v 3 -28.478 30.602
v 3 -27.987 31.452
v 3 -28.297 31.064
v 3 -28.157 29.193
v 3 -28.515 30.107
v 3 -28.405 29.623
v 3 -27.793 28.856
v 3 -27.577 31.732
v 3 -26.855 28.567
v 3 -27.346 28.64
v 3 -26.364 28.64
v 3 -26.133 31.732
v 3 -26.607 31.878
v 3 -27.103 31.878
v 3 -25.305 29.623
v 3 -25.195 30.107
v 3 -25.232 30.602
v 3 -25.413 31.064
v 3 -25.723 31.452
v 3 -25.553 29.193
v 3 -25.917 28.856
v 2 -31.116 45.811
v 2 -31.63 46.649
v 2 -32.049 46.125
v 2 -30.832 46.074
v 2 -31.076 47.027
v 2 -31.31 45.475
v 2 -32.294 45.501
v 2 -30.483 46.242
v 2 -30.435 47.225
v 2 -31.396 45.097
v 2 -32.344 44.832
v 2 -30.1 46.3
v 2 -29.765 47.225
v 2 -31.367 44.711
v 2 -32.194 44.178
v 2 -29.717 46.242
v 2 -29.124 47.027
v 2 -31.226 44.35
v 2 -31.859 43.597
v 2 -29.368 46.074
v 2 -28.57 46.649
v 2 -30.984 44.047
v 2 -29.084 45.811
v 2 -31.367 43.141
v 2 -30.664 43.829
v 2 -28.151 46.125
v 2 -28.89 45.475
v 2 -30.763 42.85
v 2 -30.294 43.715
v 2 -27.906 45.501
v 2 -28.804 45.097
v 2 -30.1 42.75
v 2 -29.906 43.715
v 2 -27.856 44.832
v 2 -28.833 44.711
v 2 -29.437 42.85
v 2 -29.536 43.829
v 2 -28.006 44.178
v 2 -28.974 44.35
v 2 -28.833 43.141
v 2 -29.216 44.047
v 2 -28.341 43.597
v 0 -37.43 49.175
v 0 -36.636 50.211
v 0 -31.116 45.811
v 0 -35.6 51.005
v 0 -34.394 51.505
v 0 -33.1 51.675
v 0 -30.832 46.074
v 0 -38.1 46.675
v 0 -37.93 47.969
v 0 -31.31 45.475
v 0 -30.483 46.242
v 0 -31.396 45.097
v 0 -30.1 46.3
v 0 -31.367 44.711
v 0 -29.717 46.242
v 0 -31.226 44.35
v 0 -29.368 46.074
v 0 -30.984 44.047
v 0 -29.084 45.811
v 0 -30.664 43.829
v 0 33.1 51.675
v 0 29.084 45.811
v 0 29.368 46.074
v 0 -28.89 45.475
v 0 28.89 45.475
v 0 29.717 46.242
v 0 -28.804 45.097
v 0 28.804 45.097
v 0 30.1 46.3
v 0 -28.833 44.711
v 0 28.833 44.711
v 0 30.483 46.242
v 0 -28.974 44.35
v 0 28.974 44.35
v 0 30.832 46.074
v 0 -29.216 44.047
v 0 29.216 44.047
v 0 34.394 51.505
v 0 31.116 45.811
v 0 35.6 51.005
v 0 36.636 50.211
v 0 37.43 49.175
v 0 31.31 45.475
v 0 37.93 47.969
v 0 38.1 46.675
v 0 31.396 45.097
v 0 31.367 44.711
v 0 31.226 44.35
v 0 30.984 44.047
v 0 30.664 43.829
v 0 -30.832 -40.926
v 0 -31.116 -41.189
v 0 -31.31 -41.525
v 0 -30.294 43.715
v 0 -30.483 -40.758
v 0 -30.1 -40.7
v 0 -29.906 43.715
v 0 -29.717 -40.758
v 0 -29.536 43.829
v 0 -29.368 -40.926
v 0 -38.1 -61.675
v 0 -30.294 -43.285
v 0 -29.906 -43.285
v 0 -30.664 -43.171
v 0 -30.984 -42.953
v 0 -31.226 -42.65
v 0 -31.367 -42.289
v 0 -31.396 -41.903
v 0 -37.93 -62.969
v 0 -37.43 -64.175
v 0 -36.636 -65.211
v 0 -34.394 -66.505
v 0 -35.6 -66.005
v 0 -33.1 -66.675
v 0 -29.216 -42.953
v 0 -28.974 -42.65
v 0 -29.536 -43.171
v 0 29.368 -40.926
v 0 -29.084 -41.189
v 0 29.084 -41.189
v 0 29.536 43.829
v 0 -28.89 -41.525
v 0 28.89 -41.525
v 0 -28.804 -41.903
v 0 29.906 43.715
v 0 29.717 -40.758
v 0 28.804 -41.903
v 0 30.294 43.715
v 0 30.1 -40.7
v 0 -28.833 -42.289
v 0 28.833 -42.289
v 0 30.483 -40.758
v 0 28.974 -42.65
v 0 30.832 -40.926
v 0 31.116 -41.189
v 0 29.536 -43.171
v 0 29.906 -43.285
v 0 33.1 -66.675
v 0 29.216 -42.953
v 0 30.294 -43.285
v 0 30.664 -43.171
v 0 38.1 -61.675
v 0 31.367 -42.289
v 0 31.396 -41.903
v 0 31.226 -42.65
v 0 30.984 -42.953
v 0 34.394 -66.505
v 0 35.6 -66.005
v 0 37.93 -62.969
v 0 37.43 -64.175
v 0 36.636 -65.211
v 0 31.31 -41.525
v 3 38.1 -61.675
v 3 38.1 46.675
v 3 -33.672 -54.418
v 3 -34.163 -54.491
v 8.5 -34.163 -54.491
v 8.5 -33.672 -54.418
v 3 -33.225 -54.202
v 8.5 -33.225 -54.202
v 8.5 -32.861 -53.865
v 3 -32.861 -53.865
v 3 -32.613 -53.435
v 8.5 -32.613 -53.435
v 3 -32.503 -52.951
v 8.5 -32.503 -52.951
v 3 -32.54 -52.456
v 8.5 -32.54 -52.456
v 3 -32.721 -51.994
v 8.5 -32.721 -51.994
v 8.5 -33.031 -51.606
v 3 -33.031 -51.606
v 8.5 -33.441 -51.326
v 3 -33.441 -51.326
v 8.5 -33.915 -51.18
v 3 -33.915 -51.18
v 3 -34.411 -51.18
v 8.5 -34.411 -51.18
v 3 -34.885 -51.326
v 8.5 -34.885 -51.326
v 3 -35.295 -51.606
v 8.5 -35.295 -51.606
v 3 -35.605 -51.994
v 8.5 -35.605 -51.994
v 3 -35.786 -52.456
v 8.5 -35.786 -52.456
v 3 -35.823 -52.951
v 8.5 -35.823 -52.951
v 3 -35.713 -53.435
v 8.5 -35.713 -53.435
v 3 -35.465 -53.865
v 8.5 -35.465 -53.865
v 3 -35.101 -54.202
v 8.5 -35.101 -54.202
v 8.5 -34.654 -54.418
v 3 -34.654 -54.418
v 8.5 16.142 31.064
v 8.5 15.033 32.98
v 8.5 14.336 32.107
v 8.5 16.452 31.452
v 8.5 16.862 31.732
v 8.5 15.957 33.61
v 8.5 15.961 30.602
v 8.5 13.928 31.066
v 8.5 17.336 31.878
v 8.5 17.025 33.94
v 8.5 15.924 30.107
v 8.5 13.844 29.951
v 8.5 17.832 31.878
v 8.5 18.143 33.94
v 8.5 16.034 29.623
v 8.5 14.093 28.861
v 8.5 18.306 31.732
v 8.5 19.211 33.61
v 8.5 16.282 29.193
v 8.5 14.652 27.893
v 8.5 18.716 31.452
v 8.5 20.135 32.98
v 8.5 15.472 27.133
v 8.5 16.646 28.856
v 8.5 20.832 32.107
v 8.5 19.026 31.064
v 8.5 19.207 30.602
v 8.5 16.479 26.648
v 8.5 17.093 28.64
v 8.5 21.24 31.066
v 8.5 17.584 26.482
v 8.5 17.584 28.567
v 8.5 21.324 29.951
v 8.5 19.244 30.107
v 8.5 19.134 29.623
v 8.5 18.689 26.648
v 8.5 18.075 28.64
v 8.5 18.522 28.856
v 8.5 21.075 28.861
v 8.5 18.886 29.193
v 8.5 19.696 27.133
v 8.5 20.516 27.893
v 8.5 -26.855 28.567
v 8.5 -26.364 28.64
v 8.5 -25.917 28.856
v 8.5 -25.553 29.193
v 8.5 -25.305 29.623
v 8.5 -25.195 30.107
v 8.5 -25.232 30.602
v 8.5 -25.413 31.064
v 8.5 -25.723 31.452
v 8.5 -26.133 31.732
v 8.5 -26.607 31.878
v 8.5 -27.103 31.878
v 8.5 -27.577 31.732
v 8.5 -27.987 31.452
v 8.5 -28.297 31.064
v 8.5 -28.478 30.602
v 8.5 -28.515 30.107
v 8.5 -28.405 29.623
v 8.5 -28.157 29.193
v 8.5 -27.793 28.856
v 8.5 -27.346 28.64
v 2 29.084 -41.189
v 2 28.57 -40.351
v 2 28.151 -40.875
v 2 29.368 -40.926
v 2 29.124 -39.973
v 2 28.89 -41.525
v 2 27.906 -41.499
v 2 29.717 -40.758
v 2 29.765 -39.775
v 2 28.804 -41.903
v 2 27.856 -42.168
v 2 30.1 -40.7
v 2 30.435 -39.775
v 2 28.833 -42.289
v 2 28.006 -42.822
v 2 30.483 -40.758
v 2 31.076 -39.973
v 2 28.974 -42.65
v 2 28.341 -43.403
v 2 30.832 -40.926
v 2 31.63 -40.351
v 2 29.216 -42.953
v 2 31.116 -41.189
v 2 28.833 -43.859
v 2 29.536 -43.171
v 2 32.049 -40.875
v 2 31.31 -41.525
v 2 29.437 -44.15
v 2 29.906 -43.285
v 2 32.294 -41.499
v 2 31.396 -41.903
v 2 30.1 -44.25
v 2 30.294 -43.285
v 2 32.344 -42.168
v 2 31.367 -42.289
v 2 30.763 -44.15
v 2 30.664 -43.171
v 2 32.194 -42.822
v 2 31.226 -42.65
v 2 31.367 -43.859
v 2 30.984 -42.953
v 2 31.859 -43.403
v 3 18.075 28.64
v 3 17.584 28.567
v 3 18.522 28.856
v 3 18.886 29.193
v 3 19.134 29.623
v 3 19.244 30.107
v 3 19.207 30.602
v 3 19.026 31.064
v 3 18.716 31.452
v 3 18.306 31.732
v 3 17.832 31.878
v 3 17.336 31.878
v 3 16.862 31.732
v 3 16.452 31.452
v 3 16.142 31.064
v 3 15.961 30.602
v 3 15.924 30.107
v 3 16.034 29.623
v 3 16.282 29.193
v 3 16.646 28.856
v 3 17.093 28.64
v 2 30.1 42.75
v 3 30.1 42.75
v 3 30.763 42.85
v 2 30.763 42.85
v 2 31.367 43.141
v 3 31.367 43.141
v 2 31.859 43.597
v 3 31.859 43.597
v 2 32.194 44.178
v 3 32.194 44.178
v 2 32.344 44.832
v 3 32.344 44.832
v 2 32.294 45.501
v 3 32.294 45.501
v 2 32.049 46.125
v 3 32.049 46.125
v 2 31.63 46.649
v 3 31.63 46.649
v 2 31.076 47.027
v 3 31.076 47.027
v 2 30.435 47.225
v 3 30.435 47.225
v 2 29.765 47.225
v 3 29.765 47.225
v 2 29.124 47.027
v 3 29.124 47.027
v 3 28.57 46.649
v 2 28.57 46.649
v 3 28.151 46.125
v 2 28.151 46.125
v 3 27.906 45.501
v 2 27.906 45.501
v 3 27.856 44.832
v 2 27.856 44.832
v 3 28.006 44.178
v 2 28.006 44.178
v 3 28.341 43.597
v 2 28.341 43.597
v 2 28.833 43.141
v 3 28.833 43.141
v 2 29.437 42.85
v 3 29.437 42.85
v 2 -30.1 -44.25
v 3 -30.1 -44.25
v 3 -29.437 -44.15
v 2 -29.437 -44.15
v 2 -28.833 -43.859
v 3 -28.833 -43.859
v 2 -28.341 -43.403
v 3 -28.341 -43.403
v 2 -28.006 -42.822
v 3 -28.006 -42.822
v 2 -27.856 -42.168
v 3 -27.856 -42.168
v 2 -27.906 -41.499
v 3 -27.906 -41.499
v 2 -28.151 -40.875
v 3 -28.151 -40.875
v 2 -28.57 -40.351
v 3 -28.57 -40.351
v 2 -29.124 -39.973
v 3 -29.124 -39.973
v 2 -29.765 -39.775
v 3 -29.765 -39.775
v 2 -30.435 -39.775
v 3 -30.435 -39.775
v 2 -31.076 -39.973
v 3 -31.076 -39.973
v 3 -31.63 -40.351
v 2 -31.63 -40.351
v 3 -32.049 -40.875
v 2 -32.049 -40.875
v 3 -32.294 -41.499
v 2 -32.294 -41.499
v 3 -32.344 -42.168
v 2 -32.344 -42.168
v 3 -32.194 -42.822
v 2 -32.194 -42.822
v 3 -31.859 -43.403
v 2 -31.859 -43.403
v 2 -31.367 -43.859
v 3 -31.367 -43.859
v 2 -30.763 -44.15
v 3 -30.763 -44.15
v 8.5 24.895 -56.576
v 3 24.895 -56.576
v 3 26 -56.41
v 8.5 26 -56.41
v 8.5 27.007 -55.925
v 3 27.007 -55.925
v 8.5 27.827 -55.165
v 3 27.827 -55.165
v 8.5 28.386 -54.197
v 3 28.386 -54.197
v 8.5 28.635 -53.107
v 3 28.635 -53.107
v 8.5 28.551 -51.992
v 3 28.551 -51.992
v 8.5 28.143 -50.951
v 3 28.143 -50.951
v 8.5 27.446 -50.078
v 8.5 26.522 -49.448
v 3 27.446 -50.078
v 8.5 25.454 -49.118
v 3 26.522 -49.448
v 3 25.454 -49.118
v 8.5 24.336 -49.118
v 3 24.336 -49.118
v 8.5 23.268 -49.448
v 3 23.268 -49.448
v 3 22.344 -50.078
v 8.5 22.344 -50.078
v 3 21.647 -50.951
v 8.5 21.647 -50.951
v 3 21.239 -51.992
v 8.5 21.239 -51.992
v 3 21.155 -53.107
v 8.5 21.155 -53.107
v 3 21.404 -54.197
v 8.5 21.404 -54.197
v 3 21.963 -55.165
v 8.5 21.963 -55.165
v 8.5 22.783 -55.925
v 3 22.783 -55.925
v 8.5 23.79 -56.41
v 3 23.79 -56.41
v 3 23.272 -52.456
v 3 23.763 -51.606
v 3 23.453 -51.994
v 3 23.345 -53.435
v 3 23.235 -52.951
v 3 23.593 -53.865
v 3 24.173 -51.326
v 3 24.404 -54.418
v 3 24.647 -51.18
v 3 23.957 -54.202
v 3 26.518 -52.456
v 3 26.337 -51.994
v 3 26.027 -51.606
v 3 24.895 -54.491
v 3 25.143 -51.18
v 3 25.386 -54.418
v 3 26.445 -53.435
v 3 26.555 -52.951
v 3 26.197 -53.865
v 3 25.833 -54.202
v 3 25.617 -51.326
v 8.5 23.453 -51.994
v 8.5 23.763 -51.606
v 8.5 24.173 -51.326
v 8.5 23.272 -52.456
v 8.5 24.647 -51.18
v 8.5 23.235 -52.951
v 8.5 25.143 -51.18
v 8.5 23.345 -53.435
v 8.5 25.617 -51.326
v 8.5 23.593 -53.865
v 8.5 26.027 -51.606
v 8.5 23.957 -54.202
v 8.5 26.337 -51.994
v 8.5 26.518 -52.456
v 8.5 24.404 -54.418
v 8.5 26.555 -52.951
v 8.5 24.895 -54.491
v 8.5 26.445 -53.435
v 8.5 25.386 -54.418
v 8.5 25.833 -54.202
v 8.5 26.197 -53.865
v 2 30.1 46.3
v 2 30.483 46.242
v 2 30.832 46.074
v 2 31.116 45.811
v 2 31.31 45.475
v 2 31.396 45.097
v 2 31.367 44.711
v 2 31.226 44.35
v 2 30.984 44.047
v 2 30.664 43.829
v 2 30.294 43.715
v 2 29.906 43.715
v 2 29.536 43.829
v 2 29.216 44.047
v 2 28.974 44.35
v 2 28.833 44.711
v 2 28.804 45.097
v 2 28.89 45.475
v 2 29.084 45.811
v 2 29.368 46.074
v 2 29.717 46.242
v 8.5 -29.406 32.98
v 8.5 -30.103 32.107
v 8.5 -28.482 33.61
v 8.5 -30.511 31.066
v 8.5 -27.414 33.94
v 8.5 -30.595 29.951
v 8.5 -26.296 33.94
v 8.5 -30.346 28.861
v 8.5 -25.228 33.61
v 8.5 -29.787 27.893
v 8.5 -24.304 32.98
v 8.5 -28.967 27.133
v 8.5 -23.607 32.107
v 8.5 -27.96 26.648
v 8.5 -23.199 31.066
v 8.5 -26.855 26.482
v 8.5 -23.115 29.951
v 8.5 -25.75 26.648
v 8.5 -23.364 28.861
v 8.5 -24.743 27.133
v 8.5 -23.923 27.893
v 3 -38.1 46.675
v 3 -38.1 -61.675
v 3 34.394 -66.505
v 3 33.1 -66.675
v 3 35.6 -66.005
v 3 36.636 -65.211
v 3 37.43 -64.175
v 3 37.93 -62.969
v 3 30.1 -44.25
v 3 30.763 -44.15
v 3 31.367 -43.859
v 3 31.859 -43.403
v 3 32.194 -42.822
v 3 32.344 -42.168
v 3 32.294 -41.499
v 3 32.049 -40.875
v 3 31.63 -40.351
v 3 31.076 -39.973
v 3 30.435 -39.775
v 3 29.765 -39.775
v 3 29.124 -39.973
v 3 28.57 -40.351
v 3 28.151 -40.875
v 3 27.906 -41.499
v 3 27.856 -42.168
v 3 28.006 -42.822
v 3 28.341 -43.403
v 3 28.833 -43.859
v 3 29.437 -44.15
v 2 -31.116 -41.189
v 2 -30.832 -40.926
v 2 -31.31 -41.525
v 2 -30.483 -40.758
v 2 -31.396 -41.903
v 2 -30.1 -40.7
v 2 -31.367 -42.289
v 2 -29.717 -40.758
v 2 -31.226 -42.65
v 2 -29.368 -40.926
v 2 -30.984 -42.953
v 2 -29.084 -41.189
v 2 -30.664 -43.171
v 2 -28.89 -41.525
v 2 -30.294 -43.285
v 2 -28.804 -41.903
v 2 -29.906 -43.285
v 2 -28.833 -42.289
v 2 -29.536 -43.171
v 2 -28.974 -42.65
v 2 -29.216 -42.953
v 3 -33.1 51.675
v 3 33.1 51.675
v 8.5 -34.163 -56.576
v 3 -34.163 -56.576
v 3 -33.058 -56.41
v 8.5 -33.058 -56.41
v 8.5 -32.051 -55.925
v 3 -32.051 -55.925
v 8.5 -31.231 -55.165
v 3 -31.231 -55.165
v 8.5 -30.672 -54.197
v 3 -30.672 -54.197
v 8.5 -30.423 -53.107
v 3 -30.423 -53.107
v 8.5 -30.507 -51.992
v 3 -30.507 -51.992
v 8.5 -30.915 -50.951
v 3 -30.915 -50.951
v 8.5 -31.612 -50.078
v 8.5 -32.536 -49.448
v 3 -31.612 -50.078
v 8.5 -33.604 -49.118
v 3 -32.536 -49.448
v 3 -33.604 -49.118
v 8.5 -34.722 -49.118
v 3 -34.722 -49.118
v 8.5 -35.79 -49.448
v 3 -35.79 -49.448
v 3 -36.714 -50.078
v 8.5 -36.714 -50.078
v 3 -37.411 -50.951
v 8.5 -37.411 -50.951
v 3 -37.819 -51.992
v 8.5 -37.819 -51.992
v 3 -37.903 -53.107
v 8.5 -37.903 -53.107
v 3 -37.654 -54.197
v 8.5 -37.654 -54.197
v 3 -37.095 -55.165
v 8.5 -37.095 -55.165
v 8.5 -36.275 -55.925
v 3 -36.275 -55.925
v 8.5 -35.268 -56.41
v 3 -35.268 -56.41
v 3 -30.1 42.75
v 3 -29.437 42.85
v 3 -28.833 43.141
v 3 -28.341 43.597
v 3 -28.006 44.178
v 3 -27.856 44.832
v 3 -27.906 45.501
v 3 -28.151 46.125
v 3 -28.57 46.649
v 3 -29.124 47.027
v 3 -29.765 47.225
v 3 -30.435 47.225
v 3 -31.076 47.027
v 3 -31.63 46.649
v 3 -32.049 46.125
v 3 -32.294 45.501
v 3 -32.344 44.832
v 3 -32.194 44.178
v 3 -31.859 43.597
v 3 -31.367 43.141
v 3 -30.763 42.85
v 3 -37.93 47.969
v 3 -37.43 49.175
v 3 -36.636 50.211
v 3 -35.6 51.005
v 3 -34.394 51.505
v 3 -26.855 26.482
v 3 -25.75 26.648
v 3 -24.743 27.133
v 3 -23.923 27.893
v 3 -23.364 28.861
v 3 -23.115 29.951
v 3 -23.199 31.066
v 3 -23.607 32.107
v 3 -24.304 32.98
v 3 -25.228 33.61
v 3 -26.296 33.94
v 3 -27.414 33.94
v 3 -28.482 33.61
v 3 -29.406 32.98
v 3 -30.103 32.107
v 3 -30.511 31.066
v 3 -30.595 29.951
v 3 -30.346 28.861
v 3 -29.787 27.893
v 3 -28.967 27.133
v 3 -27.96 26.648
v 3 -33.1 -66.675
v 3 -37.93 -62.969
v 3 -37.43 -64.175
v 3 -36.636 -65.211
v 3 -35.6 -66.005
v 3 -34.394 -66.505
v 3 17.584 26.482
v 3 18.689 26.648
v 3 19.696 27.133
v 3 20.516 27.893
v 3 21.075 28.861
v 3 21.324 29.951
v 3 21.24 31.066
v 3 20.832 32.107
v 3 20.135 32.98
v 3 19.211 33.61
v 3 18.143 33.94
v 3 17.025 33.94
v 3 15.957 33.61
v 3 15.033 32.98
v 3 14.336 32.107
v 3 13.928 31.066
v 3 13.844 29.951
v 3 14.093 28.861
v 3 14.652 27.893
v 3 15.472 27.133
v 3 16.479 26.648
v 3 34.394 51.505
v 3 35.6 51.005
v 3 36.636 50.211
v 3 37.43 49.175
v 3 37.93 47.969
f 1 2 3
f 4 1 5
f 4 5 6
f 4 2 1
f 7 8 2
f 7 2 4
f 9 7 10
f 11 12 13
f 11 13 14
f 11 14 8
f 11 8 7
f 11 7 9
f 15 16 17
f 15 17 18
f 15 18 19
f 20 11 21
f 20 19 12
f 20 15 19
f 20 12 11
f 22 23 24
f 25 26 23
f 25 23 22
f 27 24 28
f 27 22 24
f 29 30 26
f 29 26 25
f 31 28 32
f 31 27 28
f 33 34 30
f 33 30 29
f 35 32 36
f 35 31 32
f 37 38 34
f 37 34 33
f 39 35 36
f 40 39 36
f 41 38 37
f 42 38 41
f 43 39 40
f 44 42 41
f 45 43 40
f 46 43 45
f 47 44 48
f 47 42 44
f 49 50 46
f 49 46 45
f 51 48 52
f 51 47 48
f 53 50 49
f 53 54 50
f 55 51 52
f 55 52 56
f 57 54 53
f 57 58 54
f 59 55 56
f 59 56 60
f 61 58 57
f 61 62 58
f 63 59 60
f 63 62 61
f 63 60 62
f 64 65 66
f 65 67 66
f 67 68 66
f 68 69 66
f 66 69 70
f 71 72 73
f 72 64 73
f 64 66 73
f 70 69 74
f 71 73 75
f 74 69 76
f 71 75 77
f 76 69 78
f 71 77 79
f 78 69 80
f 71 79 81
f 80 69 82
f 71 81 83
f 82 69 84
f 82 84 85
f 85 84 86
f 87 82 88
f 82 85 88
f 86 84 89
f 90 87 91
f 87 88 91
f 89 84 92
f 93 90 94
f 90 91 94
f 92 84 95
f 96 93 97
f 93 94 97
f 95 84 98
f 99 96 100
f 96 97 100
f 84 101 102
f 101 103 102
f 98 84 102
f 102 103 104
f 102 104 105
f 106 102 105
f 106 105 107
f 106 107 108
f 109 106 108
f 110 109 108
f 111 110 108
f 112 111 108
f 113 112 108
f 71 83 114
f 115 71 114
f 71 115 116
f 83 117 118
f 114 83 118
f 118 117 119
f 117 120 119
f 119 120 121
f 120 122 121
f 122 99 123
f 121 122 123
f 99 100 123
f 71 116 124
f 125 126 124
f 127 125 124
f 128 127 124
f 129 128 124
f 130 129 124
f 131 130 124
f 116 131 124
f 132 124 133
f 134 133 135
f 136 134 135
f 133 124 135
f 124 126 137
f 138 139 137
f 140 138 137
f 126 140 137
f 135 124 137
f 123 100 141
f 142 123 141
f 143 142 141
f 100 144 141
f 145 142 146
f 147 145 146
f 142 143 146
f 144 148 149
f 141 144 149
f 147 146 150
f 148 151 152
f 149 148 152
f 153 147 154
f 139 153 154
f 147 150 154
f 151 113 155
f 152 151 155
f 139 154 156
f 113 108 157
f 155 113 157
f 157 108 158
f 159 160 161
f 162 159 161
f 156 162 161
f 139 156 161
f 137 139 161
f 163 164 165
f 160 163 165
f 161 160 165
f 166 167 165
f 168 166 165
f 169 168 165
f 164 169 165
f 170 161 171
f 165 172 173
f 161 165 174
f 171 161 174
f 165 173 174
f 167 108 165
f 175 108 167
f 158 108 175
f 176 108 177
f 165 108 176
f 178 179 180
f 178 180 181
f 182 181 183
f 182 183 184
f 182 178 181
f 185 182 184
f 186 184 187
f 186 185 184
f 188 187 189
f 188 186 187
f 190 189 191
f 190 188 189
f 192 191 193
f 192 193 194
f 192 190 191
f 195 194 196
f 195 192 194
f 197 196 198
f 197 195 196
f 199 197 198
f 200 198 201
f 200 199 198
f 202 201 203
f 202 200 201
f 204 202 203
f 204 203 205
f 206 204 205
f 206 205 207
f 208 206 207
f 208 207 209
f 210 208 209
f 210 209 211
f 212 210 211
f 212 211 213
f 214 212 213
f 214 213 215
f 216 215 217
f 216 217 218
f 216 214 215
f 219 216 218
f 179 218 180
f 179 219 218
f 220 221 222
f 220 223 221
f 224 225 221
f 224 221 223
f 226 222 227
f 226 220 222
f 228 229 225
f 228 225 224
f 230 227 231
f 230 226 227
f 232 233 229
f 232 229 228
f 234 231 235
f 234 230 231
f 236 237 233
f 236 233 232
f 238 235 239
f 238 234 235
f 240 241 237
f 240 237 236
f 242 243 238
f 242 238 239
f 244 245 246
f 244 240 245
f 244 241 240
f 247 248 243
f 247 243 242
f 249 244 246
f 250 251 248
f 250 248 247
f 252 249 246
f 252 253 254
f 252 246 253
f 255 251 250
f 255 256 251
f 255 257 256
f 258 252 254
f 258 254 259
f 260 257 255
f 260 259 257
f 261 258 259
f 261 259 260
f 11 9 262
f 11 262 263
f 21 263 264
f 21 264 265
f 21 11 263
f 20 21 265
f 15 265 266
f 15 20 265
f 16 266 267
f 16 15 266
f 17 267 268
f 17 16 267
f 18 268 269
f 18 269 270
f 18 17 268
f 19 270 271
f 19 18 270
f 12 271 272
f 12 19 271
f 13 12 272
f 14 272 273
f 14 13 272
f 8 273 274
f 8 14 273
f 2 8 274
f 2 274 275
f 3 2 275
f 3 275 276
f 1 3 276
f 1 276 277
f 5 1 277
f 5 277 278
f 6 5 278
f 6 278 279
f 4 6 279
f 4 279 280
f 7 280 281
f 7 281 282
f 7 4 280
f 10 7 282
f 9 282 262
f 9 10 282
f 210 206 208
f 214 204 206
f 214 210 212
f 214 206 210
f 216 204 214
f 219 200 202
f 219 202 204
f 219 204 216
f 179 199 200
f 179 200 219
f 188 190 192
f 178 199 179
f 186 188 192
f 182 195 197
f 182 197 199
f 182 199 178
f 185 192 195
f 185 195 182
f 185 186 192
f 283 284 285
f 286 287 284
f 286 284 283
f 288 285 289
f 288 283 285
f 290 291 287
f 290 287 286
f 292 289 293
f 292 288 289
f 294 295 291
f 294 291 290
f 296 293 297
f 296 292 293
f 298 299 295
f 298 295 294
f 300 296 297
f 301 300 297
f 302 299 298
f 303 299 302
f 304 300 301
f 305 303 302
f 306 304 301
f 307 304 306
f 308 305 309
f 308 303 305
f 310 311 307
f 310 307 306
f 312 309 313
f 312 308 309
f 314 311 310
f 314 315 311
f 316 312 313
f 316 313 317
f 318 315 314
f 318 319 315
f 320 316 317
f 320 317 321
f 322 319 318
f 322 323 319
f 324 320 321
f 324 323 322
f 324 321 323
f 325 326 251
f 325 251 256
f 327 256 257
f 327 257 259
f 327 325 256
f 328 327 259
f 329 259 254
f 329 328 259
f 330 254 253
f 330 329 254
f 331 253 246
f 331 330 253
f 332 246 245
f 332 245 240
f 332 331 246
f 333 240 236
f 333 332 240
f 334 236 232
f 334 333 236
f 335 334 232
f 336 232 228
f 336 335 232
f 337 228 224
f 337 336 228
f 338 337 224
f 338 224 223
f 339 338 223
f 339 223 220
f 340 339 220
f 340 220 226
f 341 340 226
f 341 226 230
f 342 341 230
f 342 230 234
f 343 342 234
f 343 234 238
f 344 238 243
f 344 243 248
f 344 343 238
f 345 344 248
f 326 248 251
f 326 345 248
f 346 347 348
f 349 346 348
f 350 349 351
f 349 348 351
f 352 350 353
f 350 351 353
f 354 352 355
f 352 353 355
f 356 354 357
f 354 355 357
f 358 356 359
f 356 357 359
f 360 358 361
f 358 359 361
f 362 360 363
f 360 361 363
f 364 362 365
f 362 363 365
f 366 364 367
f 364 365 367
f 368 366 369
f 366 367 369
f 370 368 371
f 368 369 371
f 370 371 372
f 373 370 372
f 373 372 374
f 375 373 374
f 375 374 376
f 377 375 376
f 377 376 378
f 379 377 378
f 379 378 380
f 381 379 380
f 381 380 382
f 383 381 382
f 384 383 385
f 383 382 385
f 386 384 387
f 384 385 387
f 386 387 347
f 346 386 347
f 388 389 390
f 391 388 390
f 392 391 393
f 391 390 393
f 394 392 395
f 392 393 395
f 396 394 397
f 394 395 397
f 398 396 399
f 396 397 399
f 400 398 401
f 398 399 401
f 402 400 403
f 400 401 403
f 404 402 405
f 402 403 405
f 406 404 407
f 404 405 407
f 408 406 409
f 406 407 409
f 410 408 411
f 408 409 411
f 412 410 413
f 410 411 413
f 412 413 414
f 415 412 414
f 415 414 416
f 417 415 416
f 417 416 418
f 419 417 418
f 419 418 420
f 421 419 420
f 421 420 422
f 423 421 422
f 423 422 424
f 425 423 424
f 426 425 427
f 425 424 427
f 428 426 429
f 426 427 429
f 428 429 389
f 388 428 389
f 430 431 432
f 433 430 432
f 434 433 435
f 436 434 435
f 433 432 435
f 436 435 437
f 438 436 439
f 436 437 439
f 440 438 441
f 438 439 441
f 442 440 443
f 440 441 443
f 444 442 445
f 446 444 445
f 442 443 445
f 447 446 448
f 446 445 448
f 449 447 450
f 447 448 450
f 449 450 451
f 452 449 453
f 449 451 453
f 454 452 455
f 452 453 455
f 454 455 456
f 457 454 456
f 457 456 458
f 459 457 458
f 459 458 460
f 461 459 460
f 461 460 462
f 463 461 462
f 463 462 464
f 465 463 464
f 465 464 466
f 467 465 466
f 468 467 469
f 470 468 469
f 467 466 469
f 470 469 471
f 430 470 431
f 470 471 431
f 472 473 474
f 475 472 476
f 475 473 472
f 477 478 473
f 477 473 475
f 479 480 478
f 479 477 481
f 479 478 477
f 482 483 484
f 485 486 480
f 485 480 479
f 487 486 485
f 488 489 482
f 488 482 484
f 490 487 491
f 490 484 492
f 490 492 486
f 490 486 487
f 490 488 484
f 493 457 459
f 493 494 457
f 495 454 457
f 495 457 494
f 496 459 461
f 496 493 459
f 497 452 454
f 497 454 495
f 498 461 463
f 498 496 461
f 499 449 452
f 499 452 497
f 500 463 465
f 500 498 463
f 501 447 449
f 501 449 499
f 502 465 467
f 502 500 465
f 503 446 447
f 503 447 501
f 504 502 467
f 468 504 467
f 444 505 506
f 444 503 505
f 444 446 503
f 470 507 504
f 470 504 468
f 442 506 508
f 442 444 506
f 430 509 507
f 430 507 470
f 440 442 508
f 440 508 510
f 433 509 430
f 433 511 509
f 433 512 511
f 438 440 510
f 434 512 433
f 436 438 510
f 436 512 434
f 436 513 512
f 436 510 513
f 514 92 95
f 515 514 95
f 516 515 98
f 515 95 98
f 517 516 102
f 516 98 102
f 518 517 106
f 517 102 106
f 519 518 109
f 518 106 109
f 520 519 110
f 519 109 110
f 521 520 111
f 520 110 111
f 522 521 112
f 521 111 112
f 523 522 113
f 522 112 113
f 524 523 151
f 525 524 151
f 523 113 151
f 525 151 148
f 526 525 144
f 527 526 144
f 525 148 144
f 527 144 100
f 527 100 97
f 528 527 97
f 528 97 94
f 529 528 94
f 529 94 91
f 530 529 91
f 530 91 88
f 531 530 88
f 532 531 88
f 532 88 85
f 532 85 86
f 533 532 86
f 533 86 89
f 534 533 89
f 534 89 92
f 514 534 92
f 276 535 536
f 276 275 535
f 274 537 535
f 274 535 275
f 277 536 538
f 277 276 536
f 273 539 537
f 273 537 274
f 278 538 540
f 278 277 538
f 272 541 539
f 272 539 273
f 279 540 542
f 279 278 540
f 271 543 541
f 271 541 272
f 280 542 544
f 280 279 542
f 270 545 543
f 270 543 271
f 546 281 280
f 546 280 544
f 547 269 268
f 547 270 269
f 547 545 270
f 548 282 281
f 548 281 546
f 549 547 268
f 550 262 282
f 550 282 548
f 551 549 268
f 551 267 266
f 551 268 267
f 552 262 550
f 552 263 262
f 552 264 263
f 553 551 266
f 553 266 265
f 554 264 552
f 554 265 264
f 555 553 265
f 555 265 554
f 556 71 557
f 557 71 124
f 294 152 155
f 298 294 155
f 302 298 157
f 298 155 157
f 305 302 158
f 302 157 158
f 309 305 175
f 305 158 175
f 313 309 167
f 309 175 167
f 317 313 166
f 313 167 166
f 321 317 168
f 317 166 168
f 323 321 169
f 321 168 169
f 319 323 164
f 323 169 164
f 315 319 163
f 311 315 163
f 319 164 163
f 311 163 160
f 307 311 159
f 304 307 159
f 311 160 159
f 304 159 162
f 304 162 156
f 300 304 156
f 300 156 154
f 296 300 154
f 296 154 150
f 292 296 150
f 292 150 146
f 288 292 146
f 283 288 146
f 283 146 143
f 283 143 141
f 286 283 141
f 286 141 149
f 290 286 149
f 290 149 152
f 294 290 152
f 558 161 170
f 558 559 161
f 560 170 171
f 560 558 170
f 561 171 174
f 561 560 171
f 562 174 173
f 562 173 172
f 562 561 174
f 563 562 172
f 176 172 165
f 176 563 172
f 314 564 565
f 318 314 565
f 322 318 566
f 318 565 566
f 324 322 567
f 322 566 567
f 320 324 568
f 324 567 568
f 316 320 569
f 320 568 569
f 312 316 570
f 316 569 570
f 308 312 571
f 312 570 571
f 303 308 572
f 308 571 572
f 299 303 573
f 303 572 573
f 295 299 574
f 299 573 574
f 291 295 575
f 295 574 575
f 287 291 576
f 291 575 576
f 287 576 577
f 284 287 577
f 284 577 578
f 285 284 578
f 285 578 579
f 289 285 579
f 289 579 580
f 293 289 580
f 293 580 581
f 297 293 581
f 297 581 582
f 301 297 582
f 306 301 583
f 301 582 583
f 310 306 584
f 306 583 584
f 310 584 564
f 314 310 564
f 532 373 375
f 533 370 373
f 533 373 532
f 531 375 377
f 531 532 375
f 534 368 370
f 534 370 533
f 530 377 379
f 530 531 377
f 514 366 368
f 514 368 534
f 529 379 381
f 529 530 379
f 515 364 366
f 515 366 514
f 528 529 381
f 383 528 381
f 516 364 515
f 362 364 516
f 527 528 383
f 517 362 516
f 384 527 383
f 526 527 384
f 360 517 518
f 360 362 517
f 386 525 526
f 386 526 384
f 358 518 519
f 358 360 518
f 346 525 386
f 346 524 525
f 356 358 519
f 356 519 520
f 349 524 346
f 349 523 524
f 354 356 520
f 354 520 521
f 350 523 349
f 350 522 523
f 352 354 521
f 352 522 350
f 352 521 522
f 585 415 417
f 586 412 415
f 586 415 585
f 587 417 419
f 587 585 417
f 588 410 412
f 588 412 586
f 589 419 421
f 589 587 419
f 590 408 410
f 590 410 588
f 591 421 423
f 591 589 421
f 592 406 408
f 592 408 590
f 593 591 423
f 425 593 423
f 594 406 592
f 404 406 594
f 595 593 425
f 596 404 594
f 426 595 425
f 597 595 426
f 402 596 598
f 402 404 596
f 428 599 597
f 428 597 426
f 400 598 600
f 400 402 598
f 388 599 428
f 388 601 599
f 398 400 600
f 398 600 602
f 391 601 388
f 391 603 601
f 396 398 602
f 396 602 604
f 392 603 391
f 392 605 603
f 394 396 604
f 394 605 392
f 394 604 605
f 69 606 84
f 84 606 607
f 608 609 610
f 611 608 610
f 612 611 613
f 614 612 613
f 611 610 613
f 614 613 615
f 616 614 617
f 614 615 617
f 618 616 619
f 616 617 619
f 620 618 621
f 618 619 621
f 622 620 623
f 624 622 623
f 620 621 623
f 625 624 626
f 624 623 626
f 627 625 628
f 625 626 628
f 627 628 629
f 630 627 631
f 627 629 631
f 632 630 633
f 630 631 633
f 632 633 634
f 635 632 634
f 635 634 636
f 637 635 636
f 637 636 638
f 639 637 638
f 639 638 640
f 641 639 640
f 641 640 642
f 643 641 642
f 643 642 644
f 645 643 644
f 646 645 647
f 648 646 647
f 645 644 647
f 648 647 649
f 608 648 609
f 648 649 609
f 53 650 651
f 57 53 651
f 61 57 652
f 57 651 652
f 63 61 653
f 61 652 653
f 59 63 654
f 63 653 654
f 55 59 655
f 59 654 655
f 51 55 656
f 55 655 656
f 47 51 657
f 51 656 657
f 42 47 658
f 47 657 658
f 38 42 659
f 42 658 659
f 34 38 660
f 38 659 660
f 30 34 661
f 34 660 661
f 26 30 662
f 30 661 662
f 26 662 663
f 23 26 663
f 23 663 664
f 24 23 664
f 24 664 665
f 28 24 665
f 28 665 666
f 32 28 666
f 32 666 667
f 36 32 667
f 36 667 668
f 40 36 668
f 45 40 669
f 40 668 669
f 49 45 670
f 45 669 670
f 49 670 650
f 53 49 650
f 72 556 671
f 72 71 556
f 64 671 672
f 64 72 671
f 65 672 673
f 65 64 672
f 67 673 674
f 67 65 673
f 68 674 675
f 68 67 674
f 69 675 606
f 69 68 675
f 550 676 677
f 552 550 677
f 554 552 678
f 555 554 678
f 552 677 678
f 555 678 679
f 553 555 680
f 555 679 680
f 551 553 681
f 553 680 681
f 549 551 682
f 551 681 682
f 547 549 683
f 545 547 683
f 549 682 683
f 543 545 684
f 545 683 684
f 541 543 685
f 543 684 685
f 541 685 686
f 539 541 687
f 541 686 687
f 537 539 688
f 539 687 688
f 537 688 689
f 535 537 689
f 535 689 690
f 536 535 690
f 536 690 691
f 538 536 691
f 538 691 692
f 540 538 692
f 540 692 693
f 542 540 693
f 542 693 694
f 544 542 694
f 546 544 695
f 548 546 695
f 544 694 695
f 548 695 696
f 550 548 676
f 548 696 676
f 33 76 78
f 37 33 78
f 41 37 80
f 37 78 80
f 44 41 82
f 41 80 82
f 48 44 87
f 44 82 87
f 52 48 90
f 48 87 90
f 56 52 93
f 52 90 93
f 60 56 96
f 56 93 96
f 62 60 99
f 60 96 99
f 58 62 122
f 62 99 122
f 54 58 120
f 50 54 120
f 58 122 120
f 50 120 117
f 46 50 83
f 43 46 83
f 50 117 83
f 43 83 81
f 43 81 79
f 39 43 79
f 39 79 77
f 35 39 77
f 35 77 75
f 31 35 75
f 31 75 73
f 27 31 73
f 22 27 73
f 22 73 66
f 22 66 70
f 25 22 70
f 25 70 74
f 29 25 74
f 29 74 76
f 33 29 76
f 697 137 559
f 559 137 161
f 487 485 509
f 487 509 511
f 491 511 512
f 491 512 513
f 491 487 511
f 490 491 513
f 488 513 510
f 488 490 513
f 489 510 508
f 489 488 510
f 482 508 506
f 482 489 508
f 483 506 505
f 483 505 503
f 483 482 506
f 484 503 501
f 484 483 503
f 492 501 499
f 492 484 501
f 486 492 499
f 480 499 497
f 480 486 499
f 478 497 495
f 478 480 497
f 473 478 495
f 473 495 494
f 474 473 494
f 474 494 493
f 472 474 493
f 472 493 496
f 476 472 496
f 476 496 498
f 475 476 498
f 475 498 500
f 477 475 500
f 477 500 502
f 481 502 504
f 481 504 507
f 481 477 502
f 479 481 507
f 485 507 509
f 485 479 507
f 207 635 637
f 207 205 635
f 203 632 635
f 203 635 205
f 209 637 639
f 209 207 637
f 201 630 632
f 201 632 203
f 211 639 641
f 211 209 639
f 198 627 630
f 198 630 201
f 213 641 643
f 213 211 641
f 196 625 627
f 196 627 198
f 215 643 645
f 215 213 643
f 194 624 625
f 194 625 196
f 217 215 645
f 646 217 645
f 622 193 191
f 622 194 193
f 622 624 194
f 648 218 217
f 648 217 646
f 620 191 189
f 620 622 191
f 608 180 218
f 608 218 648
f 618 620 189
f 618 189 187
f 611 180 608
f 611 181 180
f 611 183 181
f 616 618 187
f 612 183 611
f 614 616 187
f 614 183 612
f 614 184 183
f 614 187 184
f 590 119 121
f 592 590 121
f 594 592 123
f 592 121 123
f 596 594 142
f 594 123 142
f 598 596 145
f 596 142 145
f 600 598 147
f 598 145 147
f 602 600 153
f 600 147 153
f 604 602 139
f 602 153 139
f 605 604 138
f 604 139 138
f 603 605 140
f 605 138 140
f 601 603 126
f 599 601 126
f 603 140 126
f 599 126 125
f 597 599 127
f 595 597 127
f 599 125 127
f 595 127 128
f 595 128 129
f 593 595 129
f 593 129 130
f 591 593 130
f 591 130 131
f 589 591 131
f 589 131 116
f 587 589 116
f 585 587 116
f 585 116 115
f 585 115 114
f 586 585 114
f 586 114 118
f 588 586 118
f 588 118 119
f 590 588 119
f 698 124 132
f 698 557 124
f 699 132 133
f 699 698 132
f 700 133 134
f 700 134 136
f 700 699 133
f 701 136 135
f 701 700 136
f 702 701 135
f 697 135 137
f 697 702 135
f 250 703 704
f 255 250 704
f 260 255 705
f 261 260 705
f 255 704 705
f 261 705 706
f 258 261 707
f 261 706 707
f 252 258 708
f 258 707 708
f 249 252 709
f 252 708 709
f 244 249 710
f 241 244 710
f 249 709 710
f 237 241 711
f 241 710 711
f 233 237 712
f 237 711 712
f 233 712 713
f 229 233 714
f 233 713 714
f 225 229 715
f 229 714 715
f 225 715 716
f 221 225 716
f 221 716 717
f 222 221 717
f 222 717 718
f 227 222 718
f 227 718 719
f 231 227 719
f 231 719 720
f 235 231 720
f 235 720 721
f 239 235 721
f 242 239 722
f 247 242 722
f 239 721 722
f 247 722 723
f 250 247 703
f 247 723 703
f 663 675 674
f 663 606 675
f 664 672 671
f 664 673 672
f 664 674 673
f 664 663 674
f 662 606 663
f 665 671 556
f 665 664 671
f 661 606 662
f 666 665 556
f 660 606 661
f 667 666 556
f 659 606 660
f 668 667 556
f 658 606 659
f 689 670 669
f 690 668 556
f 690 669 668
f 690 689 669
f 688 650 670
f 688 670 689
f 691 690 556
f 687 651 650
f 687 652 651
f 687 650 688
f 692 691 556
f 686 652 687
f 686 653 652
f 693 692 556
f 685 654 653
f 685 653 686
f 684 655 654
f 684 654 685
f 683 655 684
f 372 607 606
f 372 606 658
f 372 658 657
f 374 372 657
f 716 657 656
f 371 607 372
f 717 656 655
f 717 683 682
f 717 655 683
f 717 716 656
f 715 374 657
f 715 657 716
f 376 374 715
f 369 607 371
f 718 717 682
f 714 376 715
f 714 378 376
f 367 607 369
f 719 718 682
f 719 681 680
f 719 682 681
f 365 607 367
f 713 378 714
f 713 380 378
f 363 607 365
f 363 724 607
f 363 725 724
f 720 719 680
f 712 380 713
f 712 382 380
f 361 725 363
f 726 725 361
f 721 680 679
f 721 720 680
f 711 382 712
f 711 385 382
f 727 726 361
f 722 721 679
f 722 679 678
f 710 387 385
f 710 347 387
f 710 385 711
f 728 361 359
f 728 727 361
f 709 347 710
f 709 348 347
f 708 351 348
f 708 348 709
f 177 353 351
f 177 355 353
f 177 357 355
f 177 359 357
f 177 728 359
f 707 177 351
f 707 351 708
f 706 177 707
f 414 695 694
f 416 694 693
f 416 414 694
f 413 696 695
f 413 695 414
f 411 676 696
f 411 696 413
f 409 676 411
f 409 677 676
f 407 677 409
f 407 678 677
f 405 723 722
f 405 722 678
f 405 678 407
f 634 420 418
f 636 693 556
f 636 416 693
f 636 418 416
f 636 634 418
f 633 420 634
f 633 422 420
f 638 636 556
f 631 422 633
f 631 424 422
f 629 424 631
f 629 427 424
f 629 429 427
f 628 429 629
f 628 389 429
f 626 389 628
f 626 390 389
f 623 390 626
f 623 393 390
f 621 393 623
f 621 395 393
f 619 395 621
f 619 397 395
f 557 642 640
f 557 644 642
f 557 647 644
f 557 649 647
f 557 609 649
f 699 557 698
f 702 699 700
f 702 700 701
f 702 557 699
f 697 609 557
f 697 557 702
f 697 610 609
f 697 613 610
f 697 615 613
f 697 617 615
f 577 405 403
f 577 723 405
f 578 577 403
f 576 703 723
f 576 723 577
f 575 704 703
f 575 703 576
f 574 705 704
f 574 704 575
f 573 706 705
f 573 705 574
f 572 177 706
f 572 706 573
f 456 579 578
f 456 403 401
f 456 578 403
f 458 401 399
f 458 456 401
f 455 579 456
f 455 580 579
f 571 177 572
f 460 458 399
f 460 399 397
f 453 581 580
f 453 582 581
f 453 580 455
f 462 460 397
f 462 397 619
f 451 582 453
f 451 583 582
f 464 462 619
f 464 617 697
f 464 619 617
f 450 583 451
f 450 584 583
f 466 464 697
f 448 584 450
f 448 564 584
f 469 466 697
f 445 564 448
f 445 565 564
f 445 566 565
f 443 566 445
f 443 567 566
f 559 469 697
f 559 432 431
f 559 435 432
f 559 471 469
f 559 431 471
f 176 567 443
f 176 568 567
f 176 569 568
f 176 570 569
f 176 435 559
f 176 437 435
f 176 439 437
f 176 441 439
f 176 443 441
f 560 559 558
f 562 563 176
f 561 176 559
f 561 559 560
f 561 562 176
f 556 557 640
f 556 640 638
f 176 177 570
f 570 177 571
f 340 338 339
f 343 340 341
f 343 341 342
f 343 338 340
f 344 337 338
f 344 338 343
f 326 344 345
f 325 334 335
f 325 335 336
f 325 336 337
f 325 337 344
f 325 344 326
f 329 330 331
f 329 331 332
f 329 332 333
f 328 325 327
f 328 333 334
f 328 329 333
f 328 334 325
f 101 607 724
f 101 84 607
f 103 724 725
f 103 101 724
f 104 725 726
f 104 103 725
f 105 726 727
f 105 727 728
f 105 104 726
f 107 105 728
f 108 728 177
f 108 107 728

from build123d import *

# Parameters (mm, degrees)
SKETCH1_W            = 133.35
SKETCH1_H            = 76.2
BOSS_EXTRUDE1_DEPTH  = 3
M2_CLEARANCE_HOLE1_D = 2.6
SKETCH7_R            = 3.75
SKETCH7_R_2          = 1.665
BOSS_EXTRUDE2_DEPTH  = 5.5
CUT_EXTRUDE1_DEPTH   = 77.989711163
FILLET1_R            = 5
SKETCH9_R            = 2.25
CUT_EXTRUDE2_DEPTH   = 1


with BuildPart() as part:
    # Sketch1 → Boss-Extrude1 (new body)
    with BuildSketch(Plane(origin=(0, 0, 0), x_dir=(0, 0, -1), z_dir=(1, 0, 0))):
        Rectangle(SKETCH1_W, SKETCH1_H)
    extrude(amount=BOSS_EXTRUDE1_DEPTH)

    # M2 Clearance Hole1 (through all)
    with Locations(Plane(origin=(3, 0, 0), x_dir=(0, 0, -1), z_dir=(1, 0, 0))):
        with Locations((-45, -30.1), (-45, 30.1), (42, 30.1), (42, -30.1)):
            Hole(M2_CLEARANCE_HOLE1_D / 2)

    # Sketch7 → Boss-Extrude2 (add)
    # profile 1 of 4: a face of its own
    with BuildSketch(Plane(origin=(3, 0, 0), x_dir=(0, 0, -1), z_dir=(1, 0, 0))):
        with Locations((-30.23150301, -26.854999996)):
            Circle(SKETCH7_R)
        with Locations((-30.23150301, -26.854999996)):
            Circle(SKETCH7_R_2, mode=Mode.SUBTRACT)
    # profile 2 of 4: a face of its own
    with BuildSketch(Plane(origin=(3, 0, 0), x_dir=(0, 0, -1), z_dir=(1, 0, 0))):
        with Locations((-30.23150301, 17.584000004)):
            Circle(SKETCH7_R)
        with Locations((-30.23150301, 17.584000004)):
            Circle(SKETCH7_R_2, mode=Mode.SUBTRACT)
    # profile 3 of 4: a face of its own
    with BuildSketch(Plane(origin=(3, 0, 0), x_dir=(0, 0, -1), z_dir=(1, 0, 0))):
        with Locations((52.82649699, 24.895000004)):
            Circle(SKETCH7_R)
        with Locations((52.82649699, 24.895000004)):
            Circle(SKETCH7_R_2, mode=Mode.SUBTRACT)
    # profile 4 of 4: a face of its own
    with BuildSketch(Plane(origin=(3, 0, 0), x_dir=(0, 0, -1), z_dir=(1, 0, 0))):
        with Locations((52.82649699, -34.162999996)):
            Circle(SKETCH7_R)
        with Locations((52.82649699, -34.162999996)):
            Circle(SKETCH7_R_2, mode=Mode.SUBTRACT)
    extrude(amount=BOSS_EXTRUDE2_DEPTH)

    # Sketch8 → Cut-Extrude1 (cut, through all)
    with BuildSketch(Plane(origin=(3, 0, 0), x_dir=(0, 0, -1), z_dir=(1, 0, 0))):
        Polygon((-51.675, -329.618471863), (-51.675, -38.1), (-51.675, 38.1), (-51.675, 329.618471863), (-634.711943726, 329.618471863), (-634.711943726, -329.618471863), align=None)
    extrude(amount=-CUT_EXTRUDE1_DEPTH, mode=Mode.SUBTRACT)

    # Fillet1
    fillet1_edges = [part.edges().sort_by_distance(p)[0] for p in [
        (1.5, -38.1, 51.675),
        (1.5, 38.1, 51.675),
        (1.5, -38.1, -66.675),
        (1.5, 38.1, -66.675),
    ]]
    fillet(fillet1_edges, radius=FILLET1_R)

    # Sketch9 → Cut-Extrude2 (cut)
    with BuildSketch(Plane(origin=(3, 0, 0), x_dir=(0, 0, -1), z_dir=(1, 0, 0))):
        with Locations((-45, -30.1)):
            Circle(SKETCH9_R)
        with Locations((-45, 30.1)):
            Circle(SKETCH9_R)
        with Locations((42, 30.1)):
            Circle(SKETCH9_R)
        with Locations((42, -30.1)):
            Circle(SKETCH9_R)
    extrude(amount=-CUT_EXTRUDE2_DEPTH, mode=Mode.SUBTRACT)


solid = part.part
